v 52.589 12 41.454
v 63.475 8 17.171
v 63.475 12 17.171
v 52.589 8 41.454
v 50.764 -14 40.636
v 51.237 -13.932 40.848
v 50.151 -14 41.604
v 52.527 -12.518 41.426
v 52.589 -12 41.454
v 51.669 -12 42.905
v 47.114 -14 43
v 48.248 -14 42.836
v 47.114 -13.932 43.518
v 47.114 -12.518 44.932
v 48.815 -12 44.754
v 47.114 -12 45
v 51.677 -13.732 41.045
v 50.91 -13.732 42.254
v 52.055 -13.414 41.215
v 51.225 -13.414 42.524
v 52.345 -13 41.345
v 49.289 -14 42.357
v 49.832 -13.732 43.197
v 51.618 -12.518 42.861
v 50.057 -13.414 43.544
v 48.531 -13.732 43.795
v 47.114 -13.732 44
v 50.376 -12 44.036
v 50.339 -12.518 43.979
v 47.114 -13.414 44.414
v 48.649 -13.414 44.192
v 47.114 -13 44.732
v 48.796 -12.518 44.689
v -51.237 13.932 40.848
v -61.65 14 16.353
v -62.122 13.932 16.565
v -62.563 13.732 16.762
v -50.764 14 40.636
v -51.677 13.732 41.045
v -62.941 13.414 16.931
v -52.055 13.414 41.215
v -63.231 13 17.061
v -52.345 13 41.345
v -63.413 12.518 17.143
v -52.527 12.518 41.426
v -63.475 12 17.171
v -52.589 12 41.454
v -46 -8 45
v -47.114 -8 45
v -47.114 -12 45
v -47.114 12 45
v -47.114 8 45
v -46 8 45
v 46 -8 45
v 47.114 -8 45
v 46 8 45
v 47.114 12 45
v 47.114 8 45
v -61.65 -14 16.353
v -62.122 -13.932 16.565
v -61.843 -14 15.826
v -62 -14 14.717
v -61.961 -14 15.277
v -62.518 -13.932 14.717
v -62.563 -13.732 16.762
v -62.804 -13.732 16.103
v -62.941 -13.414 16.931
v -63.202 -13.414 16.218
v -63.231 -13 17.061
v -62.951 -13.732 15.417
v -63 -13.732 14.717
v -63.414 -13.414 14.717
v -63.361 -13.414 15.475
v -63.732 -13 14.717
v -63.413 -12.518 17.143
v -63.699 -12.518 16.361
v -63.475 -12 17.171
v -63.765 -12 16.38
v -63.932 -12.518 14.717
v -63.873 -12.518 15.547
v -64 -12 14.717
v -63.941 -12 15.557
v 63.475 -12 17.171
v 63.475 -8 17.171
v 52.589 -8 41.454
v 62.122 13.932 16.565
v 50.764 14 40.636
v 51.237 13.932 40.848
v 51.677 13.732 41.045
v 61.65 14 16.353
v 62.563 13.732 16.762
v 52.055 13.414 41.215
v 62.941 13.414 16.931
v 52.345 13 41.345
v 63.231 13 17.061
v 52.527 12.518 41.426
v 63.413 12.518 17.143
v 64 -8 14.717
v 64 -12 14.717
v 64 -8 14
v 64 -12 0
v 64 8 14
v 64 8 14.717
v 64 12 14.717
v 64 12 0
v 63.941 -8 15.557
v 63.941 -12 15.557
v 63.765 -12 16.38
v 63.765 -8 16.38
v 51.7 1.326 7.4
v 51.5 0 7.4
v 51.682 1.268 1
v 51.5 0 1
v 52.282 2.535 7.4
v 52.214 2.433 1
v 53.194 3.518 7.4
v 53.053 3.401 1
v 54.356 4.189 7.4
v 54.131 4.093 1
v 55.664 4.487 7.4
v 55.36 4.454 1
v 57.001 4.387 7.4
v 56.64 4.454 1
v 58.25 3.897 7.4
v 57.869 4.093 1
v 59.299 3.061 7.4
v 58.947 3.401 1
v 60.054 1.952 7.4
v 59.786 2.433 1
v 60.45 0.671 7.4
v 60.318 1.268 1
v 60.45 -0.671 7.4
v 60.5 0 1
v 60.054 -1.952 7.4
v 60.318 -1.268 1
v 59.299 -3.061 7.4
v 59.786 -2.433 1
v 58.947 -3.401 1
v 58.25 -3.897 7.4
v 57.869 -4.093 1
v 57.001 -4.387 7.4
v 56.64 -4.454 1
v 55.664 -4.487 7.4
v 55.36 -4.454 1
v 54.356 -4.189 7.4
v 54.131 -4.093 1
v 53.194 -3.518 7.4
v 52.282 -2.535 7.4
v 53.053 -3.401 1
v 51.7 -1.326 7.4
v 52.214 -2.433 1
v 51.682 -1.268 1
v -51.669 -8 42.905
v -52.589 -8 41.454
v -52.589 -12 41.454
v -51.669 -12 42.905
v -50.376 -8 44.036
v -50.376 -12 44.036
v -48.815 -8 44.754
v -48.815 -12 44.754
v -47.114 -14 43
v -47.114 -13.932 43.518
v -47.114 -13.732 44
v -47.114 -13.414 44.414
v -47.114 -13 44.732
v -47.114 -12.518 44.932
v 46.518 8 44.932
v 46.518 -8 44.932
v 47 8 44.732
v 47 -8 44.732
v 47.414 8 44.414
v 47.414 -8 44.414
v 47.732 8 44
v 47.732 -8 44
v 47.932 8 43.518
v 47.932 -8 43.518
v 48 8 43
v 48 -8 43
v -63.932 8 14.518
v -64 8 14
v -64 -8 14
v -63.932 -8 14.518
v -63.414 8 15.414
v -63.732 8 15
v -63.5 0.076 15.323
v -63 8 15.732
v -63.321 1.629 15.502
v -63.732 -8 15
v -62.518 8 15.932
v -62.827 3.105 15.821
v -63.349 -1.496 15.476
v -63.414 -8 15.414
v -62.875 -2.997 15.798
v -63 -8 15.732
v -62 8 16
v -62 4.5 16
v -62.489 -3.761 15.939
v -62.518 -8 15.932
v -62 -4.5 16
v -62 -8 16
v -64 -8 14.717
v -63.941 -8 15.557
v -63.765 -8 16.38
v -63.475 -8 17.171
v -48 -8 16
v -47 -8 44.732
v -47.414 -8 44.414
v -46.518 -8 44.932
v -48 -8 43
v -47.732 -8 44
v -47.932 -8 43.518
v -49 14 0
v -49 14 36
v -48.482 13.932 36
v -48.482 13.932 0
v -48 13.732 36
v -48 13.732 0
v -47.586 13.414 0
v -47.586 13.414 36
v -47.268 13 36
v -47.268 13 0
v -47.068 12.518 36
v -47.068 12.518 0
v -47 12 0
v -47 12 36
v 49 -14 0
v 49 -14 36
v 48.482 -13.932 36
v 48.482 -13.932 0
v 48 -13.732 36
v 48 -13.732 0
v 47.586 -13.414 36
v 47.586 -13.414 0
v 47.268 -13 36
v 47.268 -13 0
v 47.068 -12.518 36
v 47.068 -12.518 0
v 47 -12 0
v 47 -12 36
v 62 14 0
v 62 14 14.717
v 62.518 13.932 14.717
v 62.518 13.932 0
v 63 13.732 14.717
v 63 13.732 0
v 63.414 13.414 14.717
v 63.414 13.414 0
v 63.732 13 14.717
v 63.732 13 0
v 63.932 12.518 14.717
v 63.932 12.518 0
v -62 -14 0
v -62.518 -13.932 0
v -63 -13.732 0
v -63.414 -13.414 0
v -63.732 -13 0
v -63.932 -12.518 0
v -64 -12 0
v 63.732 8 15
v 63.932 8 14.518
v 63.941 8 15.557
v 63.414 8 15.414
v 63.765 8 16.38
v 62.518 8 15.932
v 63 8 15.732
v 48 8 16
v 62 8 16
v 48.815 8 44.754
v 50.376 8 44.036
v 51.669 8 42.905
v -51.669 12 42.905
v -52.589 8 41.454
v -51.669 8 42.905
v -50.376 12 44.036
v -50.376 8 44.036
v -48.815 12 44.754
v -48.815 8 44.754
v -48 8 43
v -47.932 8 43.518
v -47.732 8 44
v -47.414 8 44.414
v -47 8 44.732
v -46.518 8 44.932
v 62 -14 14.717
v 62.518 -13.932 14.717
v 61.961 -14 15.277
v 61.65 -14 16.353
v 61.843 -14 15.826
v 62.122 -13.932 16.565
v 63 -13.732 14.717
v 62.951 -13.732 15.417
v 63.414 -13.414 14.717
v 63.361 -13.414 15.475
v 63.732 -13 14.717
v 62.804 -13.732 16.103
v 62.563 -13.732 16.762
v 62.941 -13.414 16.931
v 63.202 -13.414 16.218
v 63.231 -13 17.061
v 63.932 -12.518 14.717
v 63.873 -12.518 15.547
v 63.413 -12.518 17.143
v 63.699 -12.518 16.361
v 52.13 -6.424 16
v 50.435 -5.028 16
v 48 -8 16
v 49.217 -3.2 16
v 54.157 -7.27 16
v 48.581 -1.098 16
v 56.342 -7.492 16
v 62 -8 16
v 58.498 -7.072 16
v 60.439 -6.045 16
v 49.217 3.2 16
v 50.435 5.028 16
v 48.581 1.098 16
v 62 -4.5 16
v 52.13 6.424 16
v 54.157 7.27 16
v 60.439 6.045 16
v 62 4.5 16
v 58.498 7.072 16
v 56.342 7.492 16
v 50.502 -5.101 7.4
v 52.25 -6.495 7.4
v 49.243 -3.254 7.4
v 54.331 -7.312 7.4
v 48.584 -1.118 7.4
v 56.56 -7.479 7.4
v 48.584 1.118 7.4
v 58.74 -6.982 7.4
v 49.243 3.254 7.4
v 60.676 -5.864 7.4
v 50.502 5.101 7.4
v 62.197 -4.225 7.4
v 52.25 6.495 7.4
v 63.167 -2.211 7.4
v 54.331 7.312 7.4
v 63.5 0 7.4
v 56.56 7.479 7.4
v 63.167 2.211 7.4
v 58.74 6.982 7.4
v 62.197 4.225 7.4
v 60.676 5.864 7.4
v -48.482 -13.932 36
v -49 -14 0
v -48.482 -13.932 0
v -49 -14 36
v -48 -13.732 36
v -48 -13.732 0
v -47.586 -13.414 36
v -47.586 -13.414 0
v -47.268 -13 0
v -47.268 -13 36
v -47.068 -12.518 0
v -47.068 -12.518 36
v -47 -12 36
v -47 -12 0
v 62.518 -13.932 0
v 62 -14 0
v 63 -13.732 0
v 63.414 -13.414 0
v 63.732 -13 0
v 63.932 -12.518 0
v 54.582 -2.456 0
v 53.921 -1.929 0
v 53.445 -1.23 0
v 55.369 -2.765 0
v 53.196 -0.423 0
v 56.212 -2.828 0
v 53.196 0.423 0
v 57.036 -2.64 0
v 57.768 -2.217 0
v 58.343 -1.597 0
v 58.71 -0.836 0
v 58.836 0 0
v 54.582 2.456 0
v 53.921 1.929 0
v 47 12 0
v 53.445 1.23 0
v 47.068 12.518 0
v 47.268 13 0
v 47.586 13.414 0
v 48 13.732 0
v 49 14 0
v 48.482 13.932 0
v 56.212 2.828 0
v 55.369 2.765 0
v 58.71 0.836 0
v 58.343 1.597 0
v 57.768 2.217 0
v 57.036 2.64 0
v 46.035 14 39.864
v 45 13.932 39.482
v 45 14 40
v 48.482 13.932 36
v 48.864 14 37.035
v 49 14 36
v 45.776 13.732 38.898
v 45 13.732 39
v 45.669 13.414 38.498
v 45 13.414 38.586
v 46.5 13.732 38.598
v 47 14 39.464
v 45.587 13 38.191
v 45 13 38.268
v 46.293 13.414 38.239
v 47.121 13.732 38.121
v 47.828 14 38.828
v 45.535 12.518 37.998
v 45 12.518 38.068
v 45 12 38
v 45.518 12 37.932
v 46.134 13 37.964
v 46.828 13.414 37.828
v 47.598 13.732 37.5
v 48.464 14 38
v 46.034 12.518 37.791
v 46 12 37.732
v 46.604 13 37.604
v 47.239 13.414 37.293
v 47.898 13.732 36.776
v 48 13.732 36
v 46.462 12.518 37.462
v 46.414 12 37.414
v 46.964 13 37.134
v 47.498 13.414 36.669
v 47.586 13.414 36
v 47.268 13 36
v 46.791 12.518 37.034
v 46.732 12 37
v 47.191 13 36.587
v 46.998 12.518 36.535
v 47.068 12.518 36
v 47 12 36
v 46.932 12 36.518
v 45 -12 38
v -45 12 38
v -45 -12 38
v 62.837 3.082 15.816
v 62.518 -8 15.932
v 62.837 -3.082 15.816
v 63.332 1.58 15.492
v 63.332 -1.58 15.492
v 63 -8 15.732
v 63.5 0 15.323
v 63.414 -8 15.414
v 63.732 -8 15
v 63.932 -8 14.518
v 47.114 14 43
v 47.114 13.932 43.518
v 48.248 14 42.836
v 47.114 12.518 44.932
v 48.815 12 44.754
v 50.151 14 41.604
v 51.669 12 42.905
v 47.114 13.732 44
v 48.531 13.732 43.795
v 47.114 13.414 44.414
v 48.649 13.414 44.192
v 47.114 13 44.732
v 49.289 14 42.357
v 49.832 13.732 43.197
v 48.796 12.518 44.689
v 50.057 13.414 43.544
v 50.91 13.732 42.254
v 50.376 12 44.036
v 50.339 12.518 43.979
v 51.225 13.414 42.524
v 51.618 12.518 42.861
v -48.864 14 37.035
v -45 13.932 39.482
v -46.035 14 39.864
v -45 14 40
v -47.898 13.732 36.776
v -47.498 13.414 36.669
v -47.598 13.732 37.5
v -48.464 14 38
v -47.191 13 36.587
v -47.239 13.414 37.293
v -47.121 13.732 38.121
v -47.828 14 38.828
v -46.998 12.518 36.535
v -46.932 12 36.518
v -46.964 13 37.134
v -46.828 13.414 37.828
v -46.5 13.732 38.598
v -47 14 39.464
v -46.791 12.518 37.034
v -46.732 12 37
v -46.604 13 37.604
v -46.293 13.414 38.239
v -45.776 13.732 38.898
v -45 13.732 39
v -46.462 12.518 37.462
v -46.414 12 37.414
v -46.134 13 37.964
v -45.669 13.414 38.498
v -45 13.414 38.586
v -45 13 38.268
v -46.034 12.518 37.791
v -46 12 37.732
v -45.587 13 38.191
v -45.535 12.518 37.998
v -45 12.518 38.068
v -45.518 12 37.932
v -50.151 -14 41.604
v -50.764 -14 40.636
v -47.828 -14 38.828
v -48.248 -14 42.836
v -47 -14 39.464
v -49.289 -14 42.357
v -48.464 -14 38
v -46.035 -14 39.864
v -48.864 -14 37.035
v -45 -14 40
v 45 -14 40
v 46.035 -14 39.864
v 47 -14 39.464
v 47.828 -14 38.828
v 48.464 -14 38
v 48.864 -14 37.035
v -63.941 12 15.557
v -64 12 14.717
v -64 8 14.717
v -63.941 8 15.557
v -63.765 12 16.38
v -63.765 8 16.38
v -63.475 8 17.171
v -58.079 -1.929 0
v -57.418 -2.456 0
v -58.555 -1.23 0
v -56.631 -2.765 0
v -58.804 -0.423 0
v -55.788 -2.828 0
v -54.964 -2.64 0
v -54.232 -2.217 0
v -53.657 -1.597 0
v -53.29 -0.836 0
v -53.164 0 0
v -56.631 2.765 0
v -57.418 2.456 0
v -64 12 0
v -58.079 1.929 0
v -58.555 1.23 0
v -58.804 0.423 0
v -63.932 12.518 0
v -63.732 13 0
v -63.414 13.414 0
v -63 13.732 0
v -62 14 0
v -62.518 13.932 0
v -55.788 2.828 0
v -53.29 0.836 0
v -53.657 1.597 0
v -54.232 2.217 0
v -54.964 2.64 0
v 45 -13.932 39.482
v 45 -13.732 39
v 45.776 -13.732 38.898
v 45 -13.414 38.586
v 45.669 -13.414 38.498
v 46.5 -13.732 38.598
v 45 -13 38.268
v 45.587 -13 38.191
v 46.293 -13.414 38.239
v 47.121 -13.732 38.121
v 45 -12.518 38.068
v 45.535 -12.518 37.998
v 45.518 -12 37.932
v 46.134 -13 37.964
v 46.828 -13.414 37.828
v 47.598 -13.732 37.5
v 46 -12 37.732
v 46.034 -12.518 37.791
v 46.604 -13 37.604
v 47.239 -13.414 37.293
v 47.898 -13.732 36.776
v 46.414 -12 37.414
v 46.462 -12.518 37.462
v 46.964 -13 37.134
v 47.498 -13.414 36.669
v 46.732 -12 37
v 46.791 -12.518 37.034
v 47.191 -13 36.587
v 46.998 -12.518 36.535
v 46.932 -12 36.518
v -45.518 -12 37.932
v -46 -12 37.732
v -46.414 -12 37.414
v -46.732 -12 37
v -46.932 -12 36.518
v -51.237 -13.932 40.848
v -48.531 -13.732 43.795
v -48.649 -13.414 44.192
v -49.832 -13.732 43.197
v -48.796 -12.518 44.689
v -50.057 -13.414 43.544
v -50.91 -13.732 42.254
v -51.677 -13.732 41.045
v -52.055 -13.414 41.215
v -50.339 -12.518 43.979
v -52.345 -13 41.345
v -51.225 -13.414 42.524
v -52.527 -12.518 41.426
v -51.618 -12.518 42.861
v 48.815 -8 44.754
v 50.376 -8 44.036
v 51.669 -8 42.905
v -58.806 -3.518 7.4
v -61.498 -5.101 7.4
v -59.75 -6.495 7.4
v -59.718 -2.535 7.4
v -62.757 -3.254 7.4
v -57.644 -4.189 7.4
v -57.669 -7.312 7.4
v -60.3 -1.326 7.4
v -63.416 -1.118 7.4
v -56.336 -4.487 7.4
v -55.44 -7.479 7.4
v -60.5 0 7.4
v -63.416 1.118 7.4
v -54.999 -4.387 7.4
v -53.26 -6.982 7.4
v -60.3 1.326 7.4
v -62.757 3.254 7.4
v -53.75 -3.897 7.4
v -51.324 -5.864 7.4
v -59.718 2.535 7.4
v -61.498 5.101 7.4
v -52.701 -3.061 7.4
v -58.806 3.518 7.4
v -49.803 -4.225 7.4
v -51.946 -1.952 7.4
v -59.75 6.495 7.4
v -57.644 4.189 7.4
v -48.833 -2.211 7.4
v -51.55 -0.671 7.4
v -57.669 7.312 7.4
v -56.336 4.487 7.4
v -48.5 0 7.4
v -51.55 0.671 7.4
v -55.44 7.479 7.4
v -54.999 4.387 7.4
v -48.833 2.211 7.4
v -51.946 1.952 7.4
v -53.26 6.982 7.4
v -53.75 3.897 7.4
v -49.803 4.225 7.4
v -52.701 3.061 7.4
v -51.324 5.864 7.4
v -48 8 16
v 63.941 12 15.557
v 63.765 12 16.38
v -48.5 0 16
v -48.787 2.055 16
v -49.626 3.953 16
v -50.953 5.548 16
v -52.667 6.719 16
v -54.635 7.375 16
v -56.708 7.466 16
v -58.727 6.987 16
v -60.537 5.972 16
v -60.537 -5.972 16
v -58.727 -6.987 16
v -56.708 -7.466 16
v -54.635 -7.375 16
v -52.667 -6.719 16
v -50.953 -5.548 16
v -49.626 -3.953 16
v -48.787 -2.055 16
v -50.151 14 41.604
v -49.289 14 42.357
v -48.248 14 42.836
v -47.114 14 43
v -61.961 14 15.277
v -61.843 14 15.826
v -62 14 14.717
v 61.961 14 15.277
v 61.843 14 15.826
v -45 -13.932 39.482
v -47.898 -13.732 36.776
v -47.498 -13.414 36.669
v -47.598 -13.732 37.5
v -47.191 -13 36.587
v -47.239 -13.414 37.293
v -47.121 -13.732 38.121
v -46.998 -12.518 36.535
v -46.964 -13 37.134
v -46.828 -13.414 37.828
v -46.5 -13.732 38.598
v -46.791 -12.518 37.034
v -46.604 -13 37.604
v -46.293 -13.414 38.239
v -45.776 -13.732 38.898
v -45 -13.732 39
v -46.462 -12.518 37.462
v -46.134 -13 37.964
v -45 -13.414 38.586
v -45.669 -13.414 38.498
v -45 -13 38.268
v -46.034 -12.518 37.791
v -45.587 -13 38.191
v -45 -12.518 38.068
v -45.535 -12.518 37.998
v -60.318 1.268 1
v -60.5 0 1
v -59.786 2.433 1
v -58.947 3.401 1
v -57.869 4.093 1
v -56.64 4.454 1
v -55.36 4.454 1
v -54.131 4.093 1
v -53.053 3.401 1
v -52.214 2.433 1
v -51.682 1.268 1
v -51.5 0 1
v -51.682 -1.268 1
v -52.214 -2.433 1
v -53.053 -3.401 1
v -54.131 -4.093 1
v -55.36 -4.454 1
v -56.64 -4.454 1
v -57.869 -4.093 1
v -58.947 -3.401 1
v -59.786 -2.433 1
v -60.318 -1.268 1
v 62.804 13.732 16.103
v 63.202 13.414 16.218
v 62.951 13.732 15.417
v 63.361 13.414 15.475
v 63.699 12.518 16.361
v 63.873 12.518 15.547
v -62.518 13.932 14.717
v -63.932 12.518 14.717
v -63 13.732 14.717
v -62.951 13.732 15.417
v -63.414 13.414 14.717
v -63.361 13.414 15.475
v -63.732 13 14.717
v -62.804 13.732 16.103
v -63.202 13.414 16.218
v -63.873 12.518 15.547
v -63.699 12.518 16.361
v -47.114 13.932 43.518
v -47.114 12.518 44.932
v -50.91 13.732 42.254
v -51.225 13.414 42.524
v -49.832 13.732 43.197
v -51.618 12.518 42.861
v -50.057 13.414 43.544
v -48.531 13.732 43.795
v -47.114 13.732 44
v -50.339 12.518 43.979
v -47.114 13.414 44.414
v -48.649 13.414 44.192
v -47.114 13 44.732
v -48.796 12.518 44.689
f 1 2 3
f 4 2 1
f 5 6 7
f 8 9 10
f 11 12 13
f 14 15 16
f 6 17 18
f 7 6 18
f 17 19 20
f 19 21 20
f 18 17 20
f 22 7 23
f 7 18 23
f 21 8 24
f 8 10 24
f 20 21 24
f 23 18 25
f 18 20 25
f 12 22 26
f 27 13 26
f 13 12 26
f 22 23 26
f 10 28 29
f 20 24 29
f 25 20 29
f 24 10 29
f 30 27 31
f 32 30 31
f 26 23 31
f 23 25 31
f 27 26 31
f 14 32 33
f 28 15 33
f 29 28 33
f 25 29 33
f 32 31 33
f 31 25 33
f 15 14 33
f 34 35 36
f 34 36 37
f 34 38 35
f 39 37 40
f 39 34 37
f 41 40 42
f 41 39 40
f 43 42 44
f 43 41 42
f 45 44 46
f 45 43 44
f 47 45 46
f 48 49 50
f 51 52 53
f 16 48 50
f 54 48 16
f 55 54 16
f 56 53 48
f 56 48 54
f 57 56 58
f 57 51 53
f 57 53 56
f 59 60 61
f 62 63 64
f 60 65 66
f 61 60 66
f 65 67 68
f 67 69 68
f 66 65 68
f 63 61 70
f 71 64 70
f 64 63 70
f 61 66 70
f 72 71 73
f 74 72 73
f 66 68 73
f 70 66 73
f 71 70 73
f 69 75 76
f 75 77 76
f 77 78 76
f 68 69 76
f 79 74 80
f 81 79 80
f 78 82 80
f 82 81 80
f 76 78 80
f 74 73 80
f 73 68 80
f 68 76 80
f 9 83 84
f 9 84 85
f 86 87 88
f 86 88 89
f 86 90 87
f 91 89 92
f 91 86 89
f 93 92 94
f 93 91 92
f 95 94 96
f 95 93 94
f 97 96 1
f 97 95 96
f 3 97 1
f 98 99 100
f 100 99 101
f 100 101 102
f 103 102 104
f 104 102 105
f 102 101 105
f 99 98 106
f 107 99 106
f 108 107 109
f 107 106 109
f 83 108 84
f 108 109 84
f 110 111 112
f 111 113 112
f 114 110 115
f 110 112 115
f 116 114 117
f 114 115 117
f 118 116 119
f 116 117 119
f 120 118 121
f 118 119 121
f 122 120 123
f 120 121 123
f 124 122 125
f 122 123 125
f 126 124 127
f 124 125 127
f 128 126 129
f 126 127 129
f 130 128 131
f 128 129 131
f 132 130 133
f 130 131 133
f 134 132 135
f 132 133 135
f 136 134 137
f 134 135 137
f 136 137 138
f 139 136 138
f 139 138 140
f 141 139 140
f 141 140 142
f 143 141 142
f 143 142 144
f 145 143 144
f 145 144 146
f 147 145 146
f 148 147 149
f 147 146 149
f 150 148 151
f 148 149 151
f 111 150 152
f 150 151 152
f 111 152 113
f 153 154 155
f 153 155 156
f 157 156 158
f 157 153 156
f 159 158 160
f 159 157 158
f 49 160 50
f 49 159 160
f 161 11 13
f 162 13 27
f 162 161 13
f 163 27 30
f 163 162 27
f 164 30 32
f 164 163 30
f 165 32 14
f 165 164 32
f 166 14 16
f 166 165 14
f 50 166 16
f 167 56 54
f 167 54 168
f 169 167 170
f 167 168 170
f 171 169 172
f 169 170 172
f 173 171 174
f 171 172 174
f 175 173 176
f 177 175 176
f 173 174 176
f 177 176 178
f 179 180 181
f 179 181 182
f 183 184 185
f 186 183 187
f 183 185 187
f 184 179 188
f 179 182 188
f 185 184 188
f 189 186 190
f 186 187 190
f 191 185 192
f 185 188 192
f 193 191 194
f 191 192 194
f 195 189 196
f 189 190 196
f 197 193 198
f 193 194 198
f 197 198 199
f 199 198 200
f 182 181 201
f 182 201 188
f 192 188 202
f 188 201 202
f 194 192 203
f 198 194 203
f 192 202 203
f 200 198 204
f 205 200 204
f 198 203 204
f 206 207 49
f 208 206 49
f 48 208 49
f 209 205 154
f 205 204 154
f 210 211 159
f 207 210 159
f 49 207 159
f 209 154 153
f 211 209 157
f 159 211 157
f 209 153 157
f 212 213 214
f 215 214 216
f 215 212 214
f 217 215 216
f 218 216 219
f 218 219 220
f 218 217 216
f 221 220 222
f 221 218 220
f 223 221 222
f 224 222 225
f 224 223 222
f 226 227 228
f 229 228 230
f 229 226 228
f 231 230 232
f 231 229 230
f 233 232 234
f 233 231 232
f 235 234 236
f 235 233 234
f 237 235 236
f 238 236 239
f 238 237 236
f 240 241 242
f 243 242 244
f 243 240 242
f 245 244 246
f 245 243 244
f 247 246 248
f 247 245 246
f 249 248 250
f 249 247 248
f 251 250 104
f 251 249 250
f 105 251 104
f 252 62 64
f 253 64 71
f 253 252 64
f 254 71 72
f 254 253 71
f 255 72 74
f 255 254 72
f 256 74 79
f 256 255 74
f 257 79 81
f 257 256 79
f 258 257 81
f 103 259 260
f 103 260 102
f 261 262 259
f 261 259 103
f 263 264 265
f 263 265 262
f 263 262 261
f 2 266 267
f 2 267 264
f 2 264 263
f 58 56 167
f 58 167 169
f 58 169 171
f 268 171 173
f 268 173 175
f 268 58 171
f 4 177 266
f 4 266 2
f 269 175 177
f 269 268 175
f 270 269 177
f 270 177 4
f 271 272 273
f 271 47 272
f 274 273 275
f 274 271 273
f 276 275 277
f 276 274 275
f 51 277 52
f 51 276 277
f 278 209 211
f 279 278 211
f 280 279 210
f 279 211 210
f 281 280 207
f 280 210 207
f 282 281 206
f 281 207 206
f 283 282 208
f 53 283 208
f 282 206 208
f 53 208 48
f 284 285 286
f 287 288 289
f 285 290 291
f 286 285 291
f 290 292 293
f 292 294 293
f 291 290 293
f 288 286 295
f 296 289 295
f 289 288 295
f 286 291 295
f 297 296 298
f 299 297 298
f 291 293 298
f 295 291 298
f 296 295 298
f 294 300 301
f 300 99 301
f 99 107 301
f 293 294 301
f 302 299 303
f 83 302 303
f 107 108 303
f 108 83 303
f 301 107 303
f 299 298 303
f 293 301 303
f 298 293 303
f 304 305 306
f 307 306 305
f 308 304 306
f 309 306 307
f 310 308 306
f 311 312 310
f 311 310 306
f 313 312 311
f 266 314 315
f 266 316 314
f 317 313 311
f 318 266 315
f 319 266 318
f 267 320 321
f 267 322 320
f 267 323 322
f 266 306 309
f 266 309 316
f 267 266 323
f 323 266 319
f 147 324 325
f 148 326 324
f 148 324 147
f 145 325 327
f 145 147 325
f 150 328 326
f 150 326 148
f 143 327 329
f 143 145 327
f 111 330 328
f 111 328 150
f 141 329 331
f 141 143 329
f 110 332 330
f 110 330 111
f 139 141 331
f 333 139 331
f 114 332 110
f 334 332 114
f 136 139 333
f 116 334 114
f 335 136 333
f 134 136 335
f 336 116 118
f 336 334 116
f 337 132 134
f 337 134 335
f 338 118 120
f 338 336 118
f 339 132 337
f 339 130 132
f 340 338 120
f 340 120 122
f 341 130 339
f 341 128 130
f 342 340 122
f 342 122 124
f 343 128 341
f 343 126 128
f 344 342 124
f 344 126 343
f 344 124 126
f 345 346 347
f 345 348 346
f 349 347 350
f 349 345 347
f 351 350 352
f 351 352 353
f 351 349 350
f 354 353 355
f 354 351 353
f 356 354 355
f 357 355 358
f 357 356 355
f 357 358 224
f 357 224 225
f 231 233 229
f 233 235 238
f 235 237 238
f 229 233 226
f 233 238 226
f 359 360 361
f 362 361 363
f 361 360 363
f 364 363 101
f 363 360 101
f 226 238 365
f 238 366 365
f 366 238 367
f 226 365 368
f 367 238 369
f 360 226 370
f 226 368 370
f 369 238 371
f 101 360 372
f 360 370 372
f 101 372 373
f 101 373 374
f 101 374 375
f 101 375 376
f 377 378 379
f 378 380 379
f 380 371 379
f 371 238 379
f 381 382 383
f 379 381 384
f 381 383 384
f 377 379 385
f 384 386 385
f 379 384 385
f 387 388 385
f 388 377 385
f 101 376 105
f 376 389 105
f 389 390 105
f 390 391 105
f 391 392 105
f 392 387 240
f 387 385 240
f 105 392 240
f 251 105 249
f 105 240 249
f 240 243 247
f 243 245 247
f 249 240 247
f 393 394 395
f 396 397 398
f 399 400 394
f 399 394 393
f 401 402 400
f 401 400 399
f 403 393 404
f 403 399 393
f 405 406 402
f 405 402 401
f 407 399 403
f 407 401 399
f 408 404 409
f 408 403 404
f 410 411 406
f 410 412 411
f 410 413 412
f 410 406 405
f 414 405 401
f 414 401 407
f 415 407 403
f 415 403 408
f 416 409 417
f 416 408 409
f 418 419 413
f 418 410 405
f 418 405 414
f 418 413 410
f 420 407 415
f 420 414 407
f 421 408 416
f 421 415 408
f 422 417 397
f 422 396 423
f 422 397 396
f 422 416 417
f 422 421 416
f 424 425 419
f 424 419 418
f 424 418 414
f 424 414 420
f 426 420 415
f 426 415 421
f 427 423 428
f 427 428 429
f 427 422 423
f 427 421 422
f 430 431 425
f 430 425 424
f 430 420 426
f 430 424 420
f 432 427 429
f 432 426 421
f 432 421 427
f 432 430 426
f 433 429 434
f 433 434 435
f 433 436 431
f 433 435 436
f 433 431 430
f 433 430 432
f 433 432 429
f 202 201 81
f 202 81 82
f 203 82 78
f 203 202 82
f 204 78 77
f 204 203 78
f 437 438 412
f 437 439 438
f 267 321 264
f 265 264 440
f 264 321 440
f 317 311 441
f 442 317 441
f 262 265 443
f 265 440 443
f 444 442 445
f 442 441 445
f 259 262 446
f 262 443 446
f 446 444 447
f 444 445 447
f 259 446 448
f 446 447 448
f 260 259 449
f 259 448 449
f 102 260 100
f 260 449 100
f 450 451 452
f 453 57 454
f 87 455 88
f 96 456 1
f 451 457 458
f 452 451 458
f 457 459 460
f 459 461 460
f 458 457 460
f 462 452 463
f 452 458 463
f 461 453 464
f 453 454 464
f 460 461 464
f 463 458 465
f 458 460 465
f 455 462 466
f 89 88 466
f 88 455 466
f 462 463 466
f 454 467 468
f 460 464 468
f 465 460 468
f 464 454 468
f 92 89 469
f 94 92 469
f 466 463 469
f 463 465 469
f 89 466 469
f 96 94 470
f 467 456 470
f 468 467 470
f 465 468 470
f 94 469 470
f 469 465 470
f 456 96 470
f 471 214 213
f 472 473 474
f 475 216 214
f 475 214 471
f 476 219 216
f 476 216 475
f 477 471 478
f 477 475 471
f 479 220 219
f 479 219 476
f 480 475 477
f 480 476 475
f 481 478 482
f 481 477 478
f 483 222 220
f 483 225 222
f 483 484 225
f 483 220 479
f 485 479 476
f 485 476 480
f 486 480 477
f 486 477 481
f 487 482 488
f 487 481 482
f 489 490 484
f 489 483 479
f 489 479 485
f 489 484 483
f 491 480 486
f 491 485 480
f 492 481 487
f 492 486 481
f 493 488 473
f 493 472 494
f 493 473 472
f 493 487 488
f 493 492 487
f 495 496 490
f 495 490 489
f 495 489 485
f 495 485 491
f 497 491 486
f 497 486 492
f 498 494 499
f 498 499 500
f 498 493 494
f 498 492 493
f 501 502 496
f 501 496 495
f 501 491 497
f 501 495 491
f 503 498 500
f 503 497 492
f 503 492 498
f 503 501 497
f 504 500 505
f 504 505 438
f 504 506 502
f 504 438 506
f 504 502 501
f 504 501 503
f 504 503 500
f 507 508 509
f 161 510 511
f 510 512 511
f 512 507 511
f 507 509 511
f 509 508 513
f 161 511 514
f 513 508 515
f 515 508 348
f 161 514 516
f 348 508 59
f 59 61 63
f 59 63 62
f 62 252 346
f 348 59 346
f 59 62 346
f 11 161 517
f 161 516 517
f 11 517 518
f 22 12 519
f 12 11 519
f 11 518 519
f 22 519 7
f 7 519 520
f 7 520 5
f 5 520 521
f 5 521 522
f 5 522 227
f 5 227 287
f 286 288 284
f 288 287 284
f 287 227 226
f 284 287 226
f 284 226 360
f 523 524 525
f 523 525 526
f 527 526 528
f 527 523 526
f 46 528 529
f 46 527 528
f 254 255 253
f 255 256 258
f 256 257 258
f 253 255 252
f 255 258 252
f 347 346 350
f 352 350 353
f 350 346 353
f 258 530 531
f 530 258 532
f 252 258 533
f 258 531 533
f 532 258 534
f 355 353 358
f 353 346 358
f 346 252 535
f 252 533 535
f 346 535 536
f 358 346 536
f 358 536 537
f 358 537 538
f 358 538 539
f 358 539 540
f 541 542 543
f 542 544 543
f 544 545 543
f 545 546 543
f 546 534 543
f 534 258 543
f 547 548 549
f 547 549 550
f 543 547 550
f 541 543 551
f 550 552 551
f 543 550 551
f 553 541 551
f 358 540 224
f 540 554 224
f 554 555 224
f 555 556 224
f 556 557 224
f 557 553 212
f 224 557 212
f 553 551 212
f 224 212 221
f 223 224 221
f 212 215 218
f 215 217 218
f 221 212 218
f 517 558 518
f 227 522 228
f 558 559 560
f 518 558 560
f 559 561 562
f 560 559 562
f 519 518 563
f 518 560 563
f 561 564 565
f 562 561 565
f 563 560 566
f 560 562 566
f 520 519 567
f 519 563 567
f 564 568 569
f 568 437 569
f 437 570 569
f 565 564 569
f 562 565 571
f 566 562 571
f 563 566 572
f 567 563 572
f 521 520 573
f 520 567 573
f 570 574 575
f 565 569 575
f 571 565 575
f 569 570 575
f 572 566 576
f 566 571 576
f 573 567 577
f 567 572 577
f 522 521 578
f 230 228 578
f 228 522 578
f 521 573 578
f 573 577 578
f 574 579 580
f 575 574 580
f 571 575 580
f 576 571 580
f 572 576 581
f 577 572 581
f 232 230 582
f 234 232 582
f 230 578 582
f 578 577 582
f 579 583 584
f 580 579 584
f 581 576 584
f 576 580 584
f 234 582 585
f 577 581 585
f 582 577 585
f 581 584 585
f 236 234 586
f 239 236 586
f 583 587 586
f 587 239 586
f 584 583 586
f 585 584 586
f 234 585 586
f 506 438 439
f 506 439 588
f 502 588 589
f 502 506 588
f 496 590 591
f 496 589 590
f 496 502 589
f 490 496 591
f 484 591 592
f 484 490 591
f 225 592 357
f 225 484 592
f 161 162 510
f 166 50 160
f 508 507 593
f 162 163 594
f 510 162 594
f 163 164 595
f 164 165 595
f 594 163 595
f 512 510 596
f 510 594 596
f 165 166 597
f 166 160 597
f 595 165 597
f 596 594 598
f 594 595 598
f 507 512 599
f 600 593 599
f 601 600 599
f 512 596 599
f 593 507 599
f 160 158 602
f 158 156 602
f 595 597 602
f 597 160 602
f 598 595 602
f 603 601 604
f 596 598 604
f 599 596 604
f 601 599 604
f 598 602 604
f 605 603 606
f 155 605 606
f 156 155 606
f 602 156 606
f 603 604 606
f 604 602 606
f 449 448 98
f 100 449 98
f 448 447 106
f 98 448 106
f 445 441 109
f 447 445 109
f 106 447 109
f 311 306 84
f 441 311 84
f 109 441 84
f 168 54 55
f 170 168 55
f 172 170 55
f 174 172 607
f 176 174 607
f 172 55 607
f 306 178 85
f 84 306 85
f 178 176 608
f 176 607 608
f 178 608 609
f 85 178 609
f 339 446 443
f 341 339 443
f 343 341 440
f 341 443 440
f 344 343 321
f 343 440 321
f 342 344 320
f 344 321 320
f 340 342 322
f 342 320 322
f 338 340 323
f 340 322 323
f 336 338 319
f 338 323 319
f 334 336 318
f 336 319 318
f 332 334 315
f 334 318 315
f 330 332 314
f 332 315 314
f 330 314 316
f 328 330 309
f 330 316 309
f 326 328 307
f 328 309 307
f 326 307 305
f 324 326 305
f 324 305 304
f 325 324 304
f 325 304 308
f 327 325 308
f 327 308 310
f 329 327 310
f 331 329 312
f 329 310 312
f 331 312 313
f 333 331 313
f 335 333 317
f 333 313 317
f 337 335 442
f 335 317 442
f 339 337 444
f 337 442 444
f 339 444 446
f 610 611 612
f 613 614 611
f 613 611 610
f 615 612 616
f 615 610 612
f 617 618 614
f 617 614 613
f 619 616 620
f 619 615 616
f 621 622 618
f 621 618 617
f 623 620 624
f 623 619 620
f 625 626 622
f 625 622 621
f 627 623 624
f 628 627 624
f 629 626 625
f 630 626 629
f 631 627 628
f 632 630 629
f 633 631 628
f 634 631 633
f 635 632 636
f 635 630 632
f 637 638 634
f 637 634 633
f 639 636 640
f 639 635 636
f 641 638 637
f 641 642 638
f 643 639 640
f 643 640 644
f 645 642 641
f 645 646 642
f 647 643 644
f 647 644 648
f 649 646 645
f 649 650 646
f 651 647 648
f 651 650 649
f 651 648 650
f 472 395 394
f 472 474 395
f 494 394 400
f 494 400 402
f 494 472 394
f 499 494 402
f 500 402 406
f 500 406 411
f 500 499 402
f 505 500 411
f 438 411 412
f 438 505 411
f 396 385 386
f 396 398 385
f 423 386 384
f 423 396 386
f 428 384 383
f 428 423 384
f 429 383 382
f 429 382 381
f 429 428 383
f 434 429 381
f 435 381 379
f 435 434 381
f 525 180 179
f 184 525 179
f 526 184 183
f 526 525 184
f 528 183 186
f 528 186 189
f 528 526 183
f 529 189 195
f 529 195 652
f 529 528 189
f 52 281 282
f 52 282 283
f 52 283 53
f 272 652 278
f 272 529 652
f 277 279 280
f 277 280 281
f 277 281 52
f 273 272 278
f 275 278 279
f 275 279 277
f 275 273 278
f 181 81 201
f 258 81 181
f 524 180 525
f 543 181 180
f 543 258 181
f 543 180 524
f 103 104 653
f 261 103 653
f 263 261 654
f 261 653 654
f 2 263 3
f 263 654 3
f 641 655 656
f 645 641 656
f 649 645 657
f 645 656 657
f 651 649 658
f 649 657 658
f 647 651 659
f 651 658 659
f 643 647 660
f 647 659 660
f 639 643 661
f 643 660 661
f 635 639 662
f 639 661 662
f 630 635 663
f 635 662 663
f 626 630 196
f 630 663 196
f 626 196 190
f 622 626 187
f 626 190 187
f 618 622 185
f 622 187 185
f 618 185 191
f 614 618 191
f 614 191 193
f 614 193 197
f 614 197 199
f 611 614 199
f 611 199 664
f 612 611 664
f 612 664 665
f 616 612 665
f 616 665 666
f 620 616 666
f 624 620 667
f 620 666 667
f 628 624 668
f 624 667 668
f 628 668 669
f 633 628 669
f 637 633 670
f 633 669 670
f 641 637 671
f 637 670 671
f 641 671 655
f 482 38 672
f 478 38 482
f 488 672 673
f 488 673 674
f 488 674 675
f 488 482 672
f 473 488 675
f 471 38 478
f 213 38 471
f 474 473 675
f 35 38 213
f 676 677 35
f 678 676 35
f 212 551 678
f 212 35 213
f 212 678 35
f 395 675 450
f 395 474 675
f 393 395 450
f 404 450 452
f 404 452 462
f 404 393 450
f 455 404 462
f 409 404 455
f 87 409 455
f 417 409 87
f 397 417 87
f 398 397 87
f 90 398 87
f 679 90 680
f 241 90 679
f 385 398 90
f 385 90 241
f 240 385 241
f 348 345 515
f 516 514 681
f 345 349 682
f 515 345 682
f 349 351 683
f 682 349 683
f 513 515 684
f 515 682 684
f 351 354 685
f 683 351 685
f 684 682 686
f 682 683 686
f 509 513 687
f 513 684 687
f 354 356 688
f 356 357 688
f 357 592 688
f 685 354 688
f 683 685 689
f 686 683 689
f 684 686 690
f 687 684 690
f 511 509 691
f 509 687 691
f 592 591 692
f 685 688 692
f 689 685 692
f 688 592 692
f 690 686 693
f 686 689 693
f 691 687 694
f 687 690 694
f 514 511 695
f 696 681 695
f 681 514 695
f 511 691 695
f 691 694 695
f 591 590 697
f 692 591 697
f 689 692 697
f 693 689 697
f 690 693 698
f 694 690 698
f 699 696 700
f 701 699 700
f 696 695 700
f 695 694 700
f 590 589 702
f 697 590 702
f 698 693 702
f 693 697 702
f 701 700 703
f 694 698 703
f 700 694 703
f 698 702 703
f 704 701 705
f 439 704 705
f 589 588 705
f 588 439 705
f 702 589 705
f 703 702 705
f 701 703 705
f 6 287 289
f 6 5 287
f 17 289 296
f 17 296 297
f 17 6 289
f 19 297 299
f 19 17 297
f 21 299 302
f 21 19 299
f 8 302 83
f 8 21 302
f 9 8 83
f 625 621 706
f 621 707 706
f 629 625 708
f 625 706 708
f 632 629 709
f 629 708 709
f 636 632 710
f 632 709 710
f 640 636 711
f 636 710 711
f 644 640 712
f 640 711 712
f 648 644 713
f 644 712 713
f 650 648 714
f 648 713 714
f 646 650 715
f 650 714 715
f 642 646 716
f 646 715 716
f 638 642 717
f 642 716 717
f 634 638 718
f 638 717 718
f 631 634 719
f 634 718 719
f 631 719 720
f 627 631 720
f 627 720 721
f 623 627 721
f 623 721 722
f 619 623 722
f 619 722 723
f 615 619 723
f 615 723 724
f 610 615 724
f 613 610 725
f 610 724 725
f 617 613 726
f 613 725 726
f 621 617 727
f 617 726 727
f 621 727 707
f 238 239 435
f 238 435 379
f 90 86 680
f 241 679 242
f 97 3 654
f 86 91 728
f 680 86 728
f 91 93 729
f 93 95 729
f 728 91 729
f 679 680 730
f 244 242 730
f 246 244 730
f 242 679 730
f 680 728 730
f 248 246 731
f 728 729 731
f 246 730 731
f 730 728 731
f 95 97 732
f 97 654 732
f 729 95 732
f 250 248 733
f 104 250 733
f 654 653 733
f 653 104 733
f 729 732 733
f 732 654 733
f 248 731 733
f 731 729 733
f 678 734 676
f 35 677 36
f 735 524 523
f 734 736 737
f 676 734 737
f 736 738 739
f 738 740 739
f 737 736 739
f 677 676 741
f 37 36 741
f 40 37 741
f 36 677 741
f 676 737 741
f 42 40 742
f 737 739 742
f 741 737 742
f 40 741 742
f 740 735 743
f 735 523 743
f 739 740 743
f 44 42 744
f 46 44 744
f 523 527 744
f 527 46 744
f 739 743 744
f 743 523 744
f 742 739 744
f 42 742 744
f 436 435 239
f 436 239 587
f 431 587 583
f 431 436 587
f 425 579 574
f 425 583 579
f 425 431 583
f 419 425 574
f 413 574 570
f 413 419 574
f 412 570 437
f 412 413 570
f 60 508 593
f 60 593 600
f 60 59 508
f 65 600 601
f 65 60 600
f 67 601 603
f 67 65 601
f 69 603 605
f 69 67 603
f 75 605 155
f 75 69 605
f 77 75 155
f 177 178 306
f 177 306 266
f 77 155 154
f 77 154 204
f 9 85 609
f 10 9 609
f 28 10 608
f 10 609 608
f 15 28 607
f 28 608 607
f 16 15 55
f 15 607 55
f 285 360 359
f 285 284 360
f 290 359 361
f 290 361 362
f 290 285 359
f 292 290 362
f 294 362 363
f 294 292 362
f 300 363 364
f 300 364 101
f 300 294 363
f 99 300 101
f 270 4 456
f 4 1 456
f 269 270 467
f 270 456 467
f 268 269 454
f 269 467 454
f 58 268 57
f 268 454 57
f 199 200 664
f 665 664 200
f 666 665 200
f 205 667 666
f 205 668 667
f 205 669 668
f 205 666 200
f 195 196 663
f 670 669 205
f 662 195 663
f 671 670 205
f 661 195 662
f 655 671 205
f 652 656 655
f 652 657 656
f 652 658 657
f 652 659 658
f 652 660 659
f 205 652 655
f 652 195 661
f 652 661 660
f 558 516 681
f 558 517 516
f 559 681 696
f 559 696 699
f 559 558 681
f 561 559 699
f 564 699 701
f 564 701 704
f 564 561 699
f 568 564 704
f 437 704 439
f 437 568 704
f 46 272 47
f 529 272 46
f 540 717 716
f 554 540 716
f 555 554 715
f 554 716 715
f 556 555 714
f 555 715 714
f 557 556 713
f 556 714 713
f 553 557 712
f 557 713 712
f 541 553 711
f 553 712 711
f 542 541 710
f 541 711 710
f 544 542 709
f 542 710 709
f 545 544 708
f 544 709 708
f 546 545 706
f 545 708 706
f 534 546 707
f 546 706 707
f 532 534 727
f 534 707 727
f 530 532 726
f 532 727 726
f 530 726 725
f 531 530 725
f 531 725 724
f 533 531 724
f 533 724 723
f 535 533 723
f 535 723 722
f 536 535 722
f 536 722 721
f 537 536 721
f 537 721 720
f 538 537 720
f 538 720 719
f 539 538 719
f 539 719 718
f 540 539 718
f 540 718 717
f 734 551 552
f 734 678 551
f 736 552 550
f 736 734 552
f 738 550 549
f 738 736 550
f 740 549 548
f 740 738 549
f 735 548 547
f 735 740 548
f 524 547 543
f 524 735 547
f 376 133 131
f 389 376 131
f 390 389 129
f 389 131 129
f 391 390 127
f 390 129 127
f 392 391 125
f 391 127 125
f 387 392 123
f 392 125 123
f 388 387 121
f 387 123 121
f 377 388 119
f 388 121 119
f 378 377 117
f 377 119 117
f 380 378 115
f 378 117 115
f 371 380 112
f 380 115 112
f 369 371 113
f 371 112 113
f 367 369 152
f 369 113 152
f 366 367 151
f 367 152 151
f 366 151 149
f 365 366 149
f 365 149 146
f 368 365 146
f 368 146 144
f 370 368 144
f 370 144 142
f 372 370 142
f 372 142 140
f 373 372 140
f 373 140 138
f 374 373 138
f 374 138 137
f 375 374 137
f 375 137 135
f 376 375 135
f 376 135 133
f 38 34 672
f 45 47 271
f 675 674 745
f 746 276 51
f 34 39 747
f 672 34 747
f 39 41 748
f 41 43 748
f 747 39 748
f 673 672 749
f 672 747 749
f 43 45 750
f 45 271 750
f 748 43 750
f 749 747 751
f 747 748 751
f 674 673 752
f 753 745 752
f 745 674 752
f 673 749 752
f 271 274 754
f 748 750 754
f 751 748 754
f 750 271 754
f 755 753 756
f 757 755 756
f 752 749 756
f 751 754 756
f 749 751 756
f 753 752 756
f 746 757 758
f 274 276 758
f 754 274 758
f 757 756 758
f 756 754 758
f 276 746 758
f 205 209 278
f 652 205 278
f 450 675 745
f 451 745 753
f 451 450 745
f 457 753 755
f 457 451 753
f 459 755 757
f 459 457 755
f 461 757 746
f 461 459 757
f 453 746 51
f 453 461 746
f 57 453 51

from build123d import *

# Parameters (mm, degrees)
SKETCH1_W                                           = 128
SKETCH1_H                                           = 28
BOSS_EXTRUDE1_DEPTH                                 = 45
SKETCH2_OUTSIDE_W                                   = 157.708
SKETCH2_OUTSIDE_H                                   = 74.708
CUT_EXTRUDE2_DEPTH                                  = 84.096329642
FILLET1_R                                           = 6
FILLET2_R                                           = 2
SKETCH3_W                                           = 16
SKETCH3_H                                           = 16
CUT_EXTRUDE3_DEPTH                                  = 29
FILLET3_R                                           = 2
CBORE_FOR_M8_HEX_SOCKET_HEAD_CAP_SCREW1_D           = 9
CBORE_FOR_M8_HEX_SOCKET_HEAD_CAP_SCREW1_DEPTH       = 15
CBORE_FOR_M8_HEX_SOCKET_HEAD_CAP_SCREW1_CBORE_D     = 15
CBORE_FOR_M8_HEX_SOCKET_HEAD_CAP_SCREW1_CBORE_DEPTH = 8.6
CBORE_FOR_M8_HEX_SOCKET_HEAD_CAP_SCREW1_TIP         = 2.703872786


with BuildPart() as part:
    # Sketch1 → Boss-Extrude1 (new body)
    with BuildSketch(Plane.XY):
        Rectangle(SKETCH1_W, SKETCH1_H)
    extrude(amount=BOSS_EXTRUDE1_DEPTH)

    # Sketch2 outside → Cut-Extrude2 (cut, through all)
    with BuildSketch(Plane.XZ.offset(14)):
        with Locations((0, 22.5)):
            Rectangle(SKETCH2_OUTSIDE_W, SKETCH2_OUTSIDE_H)
        Polygon((-47, 0), (-47, 38), (47, 38), (47, 0), (64, 0), (64, 16), (51, 45), (-51, 45), (-64, 16), (-64, 0), align=None, mode=Mode.SUBTRACT)
    extrude(amount=-CUT_EXTRUDE2_DEPTH, mode=Mode.SUBTRACT)

    # Fillet1
    fillet1_edges = [part.edges().sort_by_distance(p)[0] for p in [
        (-64, 0, 16),
        (-51, 0, 45),
        (51, 0, 45),
        (64, 0, 16),
    ]]
    fillet(fillet1_edges, radius=FILLET1_R)

    # Fillet2
    fillet2_edges = [part.edges().sort_by_distance(p)[0] for p in [
        (-47, 14, 19),
        (0, 14, 38),
        (47, -14, 19),
        (47, 14, 19),
        (47, 0, 38),
        (0, -14, 38),
        (-47, 0, 38),
        (-47, -14, 19),
        (0, -14, 45),
        (0, 14, 45),
        (-58.032245896, -14, 29.312682233),
        (-64, -14, 7.358346808),
        (64, -14, 7.358346808),
        (58.032245896, -14, 29.312682233),
        (63.867296468, -14, 15.971616785),
        (50.375820334, -14, 44.036169802),
        (-63.867296468, -14, 15.971616785),
        (-50.375820334, -14, 44.036169802),
        (-58.032245896, 14, 29.312682233),
        (58.032245896, 14, 29.312682233),
        (64, 14, 7.358346808),
        (-64, 14, 7.358346808),
        (63.867296468, 14, 15.971616785),
        (50.375820334, 14, 44.036169802),
        (-63.867296468, 14, 15.971616785),
        (-50.375820334, 14, 44.036169802),
    ]]
    fillet(fillet2_edges, radius=FILLET2_R)

    # Sketch3 → Cut-Extrude3 (cut)
    with BuildSketch(Plane.XY.offset(45)):
        with Locations((-56, 0)):
            Rectangle(SKETCH3_W, SKETCH3_H)
        with Locations((56, 0)):
            Rectangle(SKETCH3_W, SKETCH3_H)
    extrude(amount=-CUT_EXTRUDE3_DEPTH, mode=Mode.SUBTRACT)

    # Fillet3
    # the kernel refuses this fillet: 2 mm, written as the material it takes off along each edge
    with BuildSketch(Plane(origin=(63.861153873, -8, 16), x_dir=(0.06925637128898768, 0, -0.9975988948650063), z_dir=(0, 1, 0))) as fillet3_piece_1:
        with BuildLine():
            CenterArc((1.866301026, 1.99519779), FILLET3_R, 183.971276773, 90)
            Line((-0.128896764, 1.856685047), (-0.328416543, 1.842833773))
            Line((-0.328416543, 1.842833773), (-0.199519779, -0.013851274))
            Line((-0.199519779, -0.013851274), (-0.029143426, -0.197865259))
            ThreePointArc((-0.029143426, -0.197865259), (1.303692283, -0.249155378), (2.018665043, -0.199519779))
            Line((2.018665043, -0.199519779), (2.004813769, 0))
        make_face()
    extrude(amount=16, mode=Mode.SUBTRACT)
    with BuildSketch(Plane(origin=(48, -8, 44.934279824), x_dir=(-0.999460544146637, 0, 0.032842361274859504), z_dir=(0, 1, 0))) as fillet3_piece_2:
        with BuildLine():
            CenterArc((1.935394771, -1.998921088), FILLET3_R, 88.117932867, 90)
            Line((-0.063526317, -1.933236366), (-0.263418426, -1.926667893))
            Line((-0.263418426, -1.926667893), (-0.199892109, 0.006568472))
            Line((-0.199892109, 0.006568472), (-0.02300822, 0.198672147))
            ThreePointArc((-0.02300822, 0.198672147), (0.893869228, 0.236490976), (2.007647966, 0.199892109))
            Line((2.007647966, 0.199892109), (2.001079494, 0))
        make_face()
    extrude(amount=16, mode=Mode.SUBTRACT)
    with BuildSketch(Plane(origin=(-63.861153873, -8, 16), x_dir=(-0.06925637128898415, 0, -0.9975988948650065), z_dir=(0, 1, 0))) as fillet3_piece_3:
        with BuildLine():
            CenterArc((1.866301026, -1.99519779), FILLET3_R, 86.028723227, 90)
            Line((-0.128896764, -1.856685047), (-0.328416543, -1.842833773))
            Line((-0.328416543, -1.842833773), (-0.199519779, 0.013851274))
            Line((-0.199519779, 0.013851274), (-0.029143426, 0.197865259))
            ThreePointArc((-0.029143426, 0.197865259), (1.303692283, 0.249155378), (2.018665043, 0.199519779))
            Line((2.018665043, 0.199519779), (2.004813769, 0))
        make_face()
    extrude(amount=16, mode=Mode.SUBTRACT)
    with BuildSketch(Plane(origin=(-48, -8, 44.934279824), x_dir=(0.999460544146637, 0, 0.032842361274859504), z_dir=(0, 1, 0))) as fillet3_piece_4:
        with BuildLine():
            CenterArc((1.935394771, 1.998921088), FILLET3_R, 181.882067133, 90)
            Line((-0.063526317, 1.933236366), (-0.263418426, 1.926667893))
            Line((-0.263418426, 1.926667893), (-0.199892109, -0.006568472))
            Line((-0.199892109, -0.006568472), (-0.02300822, -0.198672147))
            ThreePointArc((-0.02300822, -0.198672147), (0.893869228, -0.236490976), (2.007647966, -0.199892109))
            Line((2.007647966, -0.199892109), (2.001079494, 0))
        make_face()
    extrude(amount=16, mode=Mode.SUBTRACT)

    # CBORE for M8 Hex Socket Head Cap Screw1
    with Locations(Plane.XY.offset(16)):
        with Locations((-56, 0), (56, 0)):
            CounterBoreHole(CBORE_FOR_M8_HEX_SOCKET_HEAD_CAP_SCREW1_D / 2, CBORE_FOR_M8_HEX_SOCKET_HEAD_CAP_SCREW1_CBORE_D / 2, CBORE_FOR_M8_HEX_SOCKET_HEAD_CAP_SCREW1_CBORE_DEPTH, depth=CBORE_FOR_M8_HEX_SOCKET_HEAD_CAP_SCREW1_DEPTH)
            with Locations((0, 0, -(CBORE_FOR_M8_HEX_SOCKET_HEAD_CAP_SCREW1_DEPTH + CBORE_FOR_M8_HEX_SOCKET_HEAD_CAP_SCREW1_TIP / 2))):  # 118° drill point
                Cone(0, CBORE_FOR_M8_HEX_SOCKET_HEAD_CAP_SCREW1_D / 2, CBORE_FOR_M8_HEX_SOCKET_HEAD_CAP_SCREW1_TIP, mode=Mode.SUBTRACT)


solid = part.part
